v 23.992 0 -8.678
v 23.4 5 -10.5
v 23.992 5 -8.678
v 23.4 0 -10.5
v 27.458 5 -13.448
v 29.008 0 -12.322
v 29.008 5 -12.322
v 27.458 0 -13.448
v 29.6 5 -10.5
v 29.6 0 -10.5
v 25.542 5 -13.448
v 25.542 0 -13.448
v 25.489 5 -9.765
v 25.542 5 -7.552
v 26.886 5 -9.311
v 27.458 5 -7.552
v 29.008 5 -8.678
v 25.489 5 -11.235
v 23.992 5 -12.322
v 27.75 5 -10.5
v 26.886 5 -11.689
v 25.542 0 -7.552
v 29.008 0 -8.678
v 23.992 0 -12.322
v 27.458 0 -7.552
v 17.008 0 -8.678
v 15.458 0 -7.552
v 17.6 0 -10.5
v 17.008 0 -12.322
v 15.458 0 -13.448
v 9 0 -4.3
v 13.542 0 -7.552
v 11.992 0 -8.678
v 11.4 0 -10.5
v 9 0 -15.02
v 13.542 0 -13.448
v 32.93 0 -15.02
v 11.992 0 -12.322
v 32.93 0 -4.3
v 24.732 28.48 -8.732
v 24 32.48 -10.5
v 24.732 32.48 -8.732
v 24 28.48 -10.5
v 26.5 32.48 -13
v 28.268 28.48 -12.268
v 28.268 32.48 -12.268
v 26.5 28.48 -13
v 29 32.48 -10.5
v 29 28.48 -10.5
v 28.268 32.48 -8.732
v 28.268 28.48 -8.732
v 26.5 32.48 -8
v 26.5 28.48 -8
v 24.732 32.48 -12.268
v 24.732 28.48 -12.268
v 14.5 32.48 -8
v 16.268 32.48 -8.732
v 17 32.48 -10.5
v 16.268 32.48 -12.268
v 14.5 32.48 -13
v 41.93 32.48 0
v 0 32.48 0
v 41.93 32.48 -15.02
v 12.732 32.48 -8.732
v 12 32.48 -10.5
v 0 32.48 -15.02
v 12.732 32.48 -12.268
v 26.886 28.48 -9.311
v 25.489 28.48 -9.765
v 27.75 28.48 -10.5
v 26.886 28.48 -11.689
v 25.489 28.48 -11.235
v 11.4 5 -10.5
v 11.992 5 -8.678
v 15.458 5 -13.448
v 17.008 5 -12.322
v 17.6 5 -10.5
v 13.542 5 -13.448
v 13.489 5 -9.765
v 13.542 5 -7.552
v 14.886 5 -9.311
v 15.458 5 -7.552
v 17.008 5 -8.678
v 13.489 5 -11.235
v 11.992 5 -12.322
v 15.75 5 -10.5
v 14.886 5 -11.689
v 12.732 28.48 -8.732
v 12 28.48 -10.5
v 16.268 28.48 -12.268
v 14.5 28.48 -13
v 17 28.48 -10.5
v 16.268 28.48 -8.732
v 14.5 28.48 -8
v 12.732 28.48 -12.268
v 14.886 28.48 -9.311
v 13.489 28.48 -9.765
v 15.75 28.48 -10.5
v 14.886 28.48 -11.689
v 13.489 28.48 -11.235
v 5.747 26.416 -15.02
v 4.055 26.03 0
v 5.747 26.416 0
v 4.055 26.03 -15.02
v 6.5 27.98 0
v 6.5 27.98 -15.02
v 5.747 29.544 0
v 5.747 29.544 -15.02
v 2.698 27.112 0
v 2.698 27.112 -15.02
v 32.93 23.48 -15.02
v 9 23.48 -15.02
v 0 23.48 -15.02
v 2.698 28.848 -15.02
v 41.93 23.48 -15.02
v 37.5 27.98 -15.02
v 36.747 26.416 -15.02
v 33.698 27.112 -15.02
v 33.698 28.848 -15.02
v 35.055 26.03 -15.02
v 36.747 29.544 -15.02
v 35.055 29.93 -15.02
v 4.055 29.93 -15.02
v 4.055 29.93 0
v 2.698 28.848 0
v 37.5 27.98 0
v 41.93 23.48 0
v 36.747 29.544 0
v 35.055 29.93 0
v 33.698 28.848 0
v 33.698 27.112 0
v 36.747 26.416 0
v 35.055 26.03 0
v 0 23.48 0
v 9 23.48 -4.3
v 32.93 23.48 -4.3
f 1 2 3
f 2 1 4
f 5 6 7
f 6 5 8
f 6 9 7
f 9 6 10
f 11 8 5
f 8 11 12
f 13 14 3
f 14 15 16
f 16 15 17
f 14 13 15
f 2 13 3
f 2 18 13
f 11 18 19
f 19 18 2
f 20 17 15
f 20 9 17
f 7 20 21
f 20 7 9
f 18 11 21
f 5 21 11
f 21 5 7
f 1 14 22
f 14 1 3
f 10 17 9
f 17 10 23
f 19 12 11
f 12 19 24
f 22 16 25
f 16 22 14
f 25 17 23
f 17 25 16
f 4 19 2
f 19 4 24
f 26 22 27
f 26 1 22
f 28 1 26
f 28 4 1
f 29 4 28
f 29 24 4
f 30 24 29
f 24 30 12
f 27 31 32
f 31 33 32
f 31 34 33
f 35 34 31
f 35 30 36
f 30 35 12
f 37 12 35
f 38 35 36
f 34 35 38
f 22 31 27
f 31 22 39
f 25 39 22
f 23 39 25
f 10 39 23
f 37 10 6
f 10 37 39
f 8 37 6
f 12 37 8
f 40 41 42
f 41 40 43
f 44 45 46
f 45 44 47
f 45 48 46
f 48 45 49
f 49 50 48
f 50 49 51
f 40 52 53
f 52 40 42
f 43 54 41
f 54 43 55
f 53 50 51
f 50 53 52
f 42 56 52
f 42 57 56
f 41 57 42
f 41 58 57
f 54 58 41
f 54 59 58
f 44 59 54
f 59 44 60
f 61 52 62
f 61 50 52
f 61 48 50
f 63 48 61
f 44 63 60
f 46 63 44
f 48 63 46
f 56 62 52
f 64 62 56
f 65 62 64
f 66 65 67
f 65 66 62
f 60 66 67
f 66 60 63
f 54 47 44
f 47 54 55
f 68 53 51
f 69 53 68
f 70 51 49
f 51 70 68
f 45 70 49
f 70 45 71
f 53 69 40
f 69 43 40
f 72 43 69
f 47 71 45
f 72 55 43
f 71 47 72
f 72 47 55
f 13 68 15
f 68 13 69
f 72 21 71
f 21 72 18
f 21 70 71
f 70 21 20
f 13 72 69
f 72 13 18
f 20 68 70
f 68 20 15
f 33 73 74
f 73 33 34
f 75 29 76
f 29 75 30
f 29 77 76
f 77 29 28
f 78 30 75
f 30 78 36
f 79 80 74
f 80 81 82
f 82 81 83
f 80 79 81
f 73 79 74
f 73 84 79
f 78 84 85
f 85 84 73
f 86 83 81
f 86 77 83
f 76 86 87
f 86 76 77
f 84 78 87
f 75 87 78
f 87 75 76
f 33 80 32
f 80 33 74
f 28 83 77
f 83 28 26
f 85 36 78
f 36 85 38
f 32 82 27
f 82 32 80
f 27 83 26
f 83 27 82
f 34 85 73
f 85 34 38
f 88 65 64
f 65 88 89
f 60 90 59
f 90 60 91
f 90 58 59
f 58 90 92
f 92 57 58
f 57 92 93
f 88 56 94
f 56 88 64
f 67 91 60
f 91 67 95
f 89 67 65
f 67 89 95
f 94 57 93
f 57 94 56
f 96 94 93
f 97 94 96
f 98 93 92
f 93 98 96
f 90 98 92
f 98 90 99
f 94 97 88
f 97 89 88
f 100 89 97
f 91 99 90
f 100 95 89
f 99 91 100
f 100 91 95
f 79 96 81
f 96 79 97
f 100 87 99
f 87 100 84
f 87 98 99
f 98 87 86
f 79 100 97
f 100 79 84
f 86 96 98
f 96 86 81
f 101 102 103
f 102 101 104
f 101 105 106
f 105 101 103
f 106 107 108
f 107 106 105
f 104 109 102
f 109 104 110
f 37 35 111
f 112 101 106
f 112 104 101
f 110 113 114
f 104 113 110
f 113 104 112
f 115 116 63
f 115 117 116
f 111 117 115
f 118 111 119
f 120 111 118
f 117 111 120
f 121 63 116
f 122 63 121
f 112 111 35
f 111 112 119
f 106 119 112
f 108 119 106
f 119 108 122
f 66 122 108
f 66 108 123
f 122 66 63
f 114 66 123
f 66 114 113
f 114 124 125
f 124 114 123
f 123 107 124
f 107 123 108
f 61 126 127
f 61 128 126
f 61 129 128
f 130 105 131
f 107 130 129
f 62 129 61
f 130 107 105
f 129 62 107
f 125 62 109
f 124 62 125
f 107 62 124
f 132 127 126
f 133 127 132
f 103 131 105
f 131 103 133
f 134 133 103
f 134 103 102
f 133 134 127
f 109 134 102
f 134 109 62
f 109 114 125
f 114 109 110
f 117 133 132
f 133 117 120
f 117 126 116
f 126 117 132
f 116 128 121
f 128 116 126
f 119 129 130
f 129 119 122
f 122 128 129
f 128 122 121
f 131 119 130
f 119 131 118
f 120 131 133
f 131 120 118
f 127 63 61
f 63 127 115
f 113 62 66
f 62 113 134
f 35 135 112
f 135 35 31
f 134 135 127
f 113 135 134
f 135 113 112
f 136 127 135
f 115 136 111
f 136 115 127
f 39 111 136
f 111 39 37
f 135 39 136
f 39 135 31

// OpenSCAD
//pnu_head

fan_off       = 4.5;
fan_spacing   = 31;
fan_r         = 2;

head_x        = 41.93;
head_y        = 15.02;
head_z        = 9.45;
head_off_x    = 14.5;
head_off_y    = 10.5;
head_spacing  = 12.0;
head_r        = 3.1;

pnu_r         = 2.5;
pnu_clr       = 4;

screw_clr     = 5;

fat           = 2 * fan_off;

main = [
    head_x, 
    head_y,
    head_x - head_z,
];
    
rotate([-90,0,0]) difference() {
    cube(main);
    // head holes
    translate ([
        head_off_x,
        head_off_y,
        0
    ]) {
        {
            cylinder ( h = screw_clr, r = head_r );
            translate([0, 0, main[2] - pnu_clr]) cylinder ( h = pnu_clr, r = pnu_r);
            cylinder ( h = main[2], r = 1.25 );
        }
        translate([head_spacing,0,0]) {
            cylinder ( h = screw_clr, r = head_r );
            translate([0, 0, main[2] - pnu_clr]) cylinder ( h = pnu_clr, r = pnu_r);
            cylinder ( h = main[2], r = 1.25 );
        }
    }
    // fan holes
    translate([fan_off, 0, main[2] - fan_off]){
        rotate([-90,0,0]) {
            cylinder(h = main[1], r = fan_r);
            translate([fan_spacing,0,0]) cylinder(h = main[1], r = fan_r);
         }
     }  
     // fat trimming
     cube([fat, main[1], main[2] - 2 * fan_off]);
     translate([main[0]-fat,0,0])cube([fat, main[1], main[2] - 2 * fan_off]);
     cube([main[0], head_off_y - 2 * head_r, main[2] - 2 * fan_off]);
     
}
    
    
    
